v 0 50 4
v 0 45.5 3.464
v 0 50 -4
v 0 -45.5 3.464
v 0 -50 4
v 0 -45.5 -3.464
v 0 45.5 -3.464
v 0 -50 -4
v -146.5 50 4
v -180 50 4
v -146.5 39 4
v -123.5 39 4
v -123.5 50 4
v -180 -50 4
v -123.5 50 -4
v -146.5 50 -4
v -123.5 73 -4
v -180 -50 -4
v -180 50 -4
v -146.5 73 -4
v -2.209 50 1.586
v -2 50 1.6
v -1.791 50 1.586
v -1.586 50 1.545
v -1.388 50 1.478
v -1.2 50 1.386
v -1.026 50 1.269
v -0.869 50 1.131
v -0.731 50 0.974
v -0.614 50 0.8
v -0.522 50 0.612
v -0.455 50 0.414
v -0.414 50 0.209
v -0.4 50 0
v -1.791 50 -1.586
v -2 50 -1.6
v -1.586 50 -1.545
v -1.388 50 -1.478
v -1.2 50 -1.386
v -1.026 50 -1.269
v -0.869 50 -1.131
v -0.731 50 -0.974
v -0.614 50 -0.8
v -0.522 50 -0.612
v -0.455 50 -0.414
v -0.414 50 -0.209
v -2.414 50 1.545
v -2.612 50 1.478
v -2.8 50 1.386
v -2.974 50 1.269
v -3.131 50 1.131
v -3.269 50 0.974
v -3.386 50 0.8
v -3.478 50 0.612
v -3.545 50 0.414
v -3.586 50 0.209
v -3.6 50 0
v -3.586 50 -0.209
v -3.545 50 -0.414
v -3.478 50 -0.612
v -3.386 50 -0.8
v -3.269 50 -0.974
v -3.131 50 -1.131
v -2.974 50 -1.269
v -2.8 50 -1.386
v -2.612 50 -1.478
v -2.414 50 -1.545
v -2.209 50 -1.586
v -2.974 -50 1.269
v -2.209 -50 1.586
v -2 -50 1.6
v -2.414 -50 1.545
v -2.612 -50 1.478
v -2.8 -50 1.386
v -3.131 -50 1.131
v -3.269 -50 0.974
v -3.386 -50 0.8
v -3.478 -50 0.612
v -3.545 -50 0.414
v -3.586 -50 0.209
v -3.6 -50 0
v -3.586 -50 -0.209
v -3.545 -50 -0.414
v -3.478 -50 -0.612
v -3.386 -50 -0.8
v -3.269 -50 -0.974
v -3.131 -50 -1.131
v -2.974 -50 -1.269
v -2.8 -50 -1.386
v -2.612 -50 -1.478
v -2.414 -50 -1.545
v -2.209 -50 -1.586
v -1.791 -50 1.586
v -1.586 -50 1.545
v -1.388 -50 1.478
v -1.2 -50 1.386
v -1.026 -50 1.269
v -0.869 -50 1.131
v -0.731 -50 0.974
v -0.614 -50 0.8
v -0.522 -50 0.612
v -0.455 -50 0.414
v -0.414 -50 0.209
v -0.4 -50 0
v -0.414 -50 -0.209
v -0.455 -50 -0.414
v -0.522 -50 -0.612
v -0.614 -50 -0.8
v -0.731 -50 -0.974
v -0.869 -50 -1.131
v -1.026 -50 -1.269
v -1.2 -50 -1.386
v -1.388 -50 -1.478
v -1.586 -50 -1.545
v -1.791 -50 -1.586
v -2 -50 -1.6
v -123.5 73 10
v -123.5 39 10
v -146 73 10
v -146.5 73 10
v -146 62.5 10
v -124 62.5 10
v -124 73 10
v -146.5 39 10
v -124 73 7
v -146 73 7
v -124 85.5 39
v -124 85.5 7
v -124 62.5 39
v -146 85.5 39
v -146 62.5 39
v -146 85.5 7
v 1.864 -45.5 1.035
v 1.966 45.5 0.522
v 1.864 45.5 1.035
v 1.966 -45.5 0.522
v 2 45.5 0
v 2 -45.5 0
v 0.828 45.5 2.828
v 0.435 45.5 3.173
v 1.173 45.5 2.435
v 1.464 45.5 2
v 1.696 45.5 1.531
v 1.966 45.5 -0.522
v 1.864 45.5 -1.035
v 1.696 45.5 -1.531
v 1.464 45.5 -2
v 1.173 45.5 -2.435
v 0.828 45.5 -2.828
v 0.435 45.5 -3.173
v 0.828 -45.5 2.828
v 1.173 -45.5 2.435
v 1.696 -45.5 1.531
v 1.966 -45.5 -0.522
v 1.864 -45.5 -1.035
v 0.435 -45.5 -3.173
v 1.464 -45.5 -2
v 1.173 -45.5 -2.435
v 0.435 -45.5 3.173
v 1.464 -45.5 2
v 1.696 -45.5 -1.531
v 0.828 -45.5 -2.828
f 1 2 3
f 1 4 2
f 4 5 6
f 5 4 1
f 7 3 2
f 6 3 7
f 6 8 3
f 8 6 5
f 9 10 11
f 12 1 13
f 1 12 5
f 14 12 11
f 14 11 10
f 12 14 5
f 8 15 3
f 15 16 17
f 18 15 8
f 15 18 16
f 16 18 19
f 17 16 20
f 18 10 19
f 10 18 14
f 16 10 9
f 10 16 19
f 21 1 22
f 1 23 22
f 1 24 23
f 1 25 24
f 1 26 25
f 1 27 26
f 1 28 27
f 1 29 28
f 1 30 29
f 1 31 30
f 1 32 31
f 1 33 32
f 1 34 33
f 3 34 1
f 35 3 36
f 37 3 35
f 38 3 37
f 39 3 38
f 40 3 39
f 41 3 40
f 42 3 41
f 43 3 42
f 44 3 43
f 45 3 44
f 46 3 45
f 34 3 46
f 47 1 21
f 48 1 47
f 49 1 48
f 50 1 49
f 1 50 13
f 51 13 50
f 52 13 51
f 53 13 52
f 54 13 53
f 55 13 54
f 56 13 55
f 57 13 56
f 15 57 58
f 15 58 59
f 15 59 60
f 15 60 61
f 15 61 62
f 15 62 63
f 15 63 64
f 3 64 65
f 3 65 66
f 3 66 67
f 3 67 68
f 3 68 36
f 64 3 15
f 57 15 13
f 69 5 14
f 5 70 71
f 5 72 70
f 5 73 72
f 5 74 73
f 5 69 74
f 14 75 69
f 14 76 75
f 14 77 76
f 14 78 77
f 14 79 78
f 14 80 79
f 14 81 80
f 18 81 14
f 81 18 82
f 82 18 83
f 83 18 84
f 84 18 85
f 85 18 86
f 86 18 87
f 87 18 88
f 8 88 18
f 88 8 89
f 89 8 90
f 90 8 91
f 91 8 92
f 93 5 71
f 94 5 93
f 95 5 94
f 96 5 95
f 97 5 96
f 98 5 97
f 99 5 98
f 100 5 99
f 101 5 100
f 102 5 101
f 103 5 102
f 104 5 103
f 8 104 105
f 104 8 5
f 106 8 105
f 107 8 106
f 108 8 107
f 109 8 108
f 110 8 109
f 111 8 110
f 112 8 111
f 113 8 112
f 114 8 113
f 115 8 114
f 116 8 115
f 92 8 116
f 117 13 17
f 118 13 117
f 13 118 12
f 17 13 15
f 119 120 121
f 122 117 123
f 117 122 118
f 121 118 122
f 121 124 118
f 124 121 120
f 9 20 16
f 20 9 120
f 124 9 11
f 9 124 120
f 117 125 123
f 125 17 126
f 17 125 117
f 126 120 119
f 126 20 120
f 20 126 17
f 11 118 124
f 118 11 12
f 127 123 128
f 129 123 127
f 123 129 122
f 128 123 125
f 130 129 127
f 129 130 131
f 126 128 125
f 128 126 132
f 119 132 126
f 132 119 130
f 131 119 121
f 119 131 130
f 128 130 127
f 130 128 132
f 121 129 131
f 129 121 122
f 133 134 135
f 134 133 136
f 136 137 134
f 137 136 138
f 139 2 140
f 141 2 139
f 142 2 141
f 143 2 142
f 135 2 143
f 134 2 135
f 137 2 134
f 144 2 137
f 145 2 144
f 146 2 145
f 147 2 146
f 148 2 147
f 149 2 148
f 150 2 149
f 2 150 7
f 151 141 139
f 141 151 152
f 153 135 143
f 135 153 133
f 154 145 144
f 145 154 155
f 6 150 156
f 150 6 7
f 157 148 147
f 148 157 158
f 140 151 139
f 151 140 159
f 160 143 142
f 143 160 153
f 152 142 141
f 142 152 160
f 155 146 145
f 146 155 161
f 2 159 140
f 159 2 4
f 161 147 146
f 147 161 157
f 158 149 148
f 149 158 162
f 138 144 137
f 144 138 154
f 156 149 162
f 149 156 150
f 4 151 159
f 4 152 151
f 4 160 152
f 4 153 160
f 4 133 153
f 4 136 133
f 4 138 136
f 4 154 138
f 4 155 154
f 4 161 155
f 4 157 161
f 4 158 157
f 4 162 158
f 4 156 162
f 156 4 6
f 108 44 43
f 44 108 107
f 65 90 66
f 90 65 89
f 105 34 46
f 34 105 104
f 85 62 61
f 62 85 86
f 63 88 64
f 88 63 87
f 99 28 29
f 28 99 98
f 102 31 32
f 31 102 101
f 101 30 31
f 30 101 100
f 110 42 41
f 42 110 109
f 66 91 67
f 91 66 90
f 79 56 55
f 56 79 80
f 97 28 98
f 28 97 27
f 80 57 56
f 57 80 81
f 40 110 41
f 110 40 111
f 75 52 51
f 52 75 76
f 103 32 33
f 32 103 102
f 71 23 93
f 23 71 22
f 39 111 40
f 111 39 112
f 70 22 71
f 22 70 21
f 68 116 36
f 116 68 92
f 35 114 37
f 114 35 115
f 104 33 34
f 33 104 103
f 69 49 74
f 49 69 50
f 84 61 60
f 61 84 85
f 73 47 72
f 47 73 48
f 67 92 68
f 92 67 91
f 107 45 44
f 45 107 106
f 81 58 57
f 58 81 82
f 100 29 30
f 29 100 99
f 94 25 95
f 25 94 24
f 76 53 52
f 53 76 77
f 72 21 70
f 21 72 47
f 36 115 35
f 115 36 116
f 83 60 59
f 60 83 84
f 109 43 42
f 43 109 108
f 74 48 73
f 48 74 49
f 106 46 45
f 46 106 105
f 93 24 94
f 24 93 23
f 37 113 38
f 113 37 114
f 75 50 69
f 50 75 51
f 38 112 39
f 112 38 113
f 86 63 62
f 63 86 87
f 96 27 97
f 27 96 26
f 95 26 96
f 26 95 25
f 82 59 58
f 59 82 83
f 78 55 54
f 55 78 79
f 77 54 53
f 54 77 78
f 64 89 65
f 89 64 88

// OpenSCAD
// Printable nominal panel, support and holder, dimensions in mm.
// Drill the indicated axle holes after printing if the measured fit requires it.
part = "panel";
$fn=48;
module block(center,size) { translate(center) cube(size,center=true); }
module axle(center,length,radius) {
    translate(center) rotate([90,0,0]) cylinder(r=radius,h=length,center=true);
}
module panel() {
    difference() {
        union() {
            block([-90,0,0],[180,100,8]);
            block([-135,56,3],[23,34,14]);
            block([-135,74,23],[22,23,32]);
            axle([-2,0,0],91,4);
        }
        axle([-2,0,0],102,1.6);
    }
}
module base() {
    difference() {
        union() {
            block([38,0,-34],[120,118,10]);
            for (side = [-1,1])
                block([-2,side*51,-15],[21,9,39]);
        }
        axle([-2,0,0],120,1.6);
    }
}
module support() {
    block([0,0,0],[38,28,35]);
    block([0,-43,-6],[18,74,14]);
    block([0,-74,0],[24,24,35]);
}
if (part=="panel") panel();
if (part=="base") base();
if (part=="support") support();
